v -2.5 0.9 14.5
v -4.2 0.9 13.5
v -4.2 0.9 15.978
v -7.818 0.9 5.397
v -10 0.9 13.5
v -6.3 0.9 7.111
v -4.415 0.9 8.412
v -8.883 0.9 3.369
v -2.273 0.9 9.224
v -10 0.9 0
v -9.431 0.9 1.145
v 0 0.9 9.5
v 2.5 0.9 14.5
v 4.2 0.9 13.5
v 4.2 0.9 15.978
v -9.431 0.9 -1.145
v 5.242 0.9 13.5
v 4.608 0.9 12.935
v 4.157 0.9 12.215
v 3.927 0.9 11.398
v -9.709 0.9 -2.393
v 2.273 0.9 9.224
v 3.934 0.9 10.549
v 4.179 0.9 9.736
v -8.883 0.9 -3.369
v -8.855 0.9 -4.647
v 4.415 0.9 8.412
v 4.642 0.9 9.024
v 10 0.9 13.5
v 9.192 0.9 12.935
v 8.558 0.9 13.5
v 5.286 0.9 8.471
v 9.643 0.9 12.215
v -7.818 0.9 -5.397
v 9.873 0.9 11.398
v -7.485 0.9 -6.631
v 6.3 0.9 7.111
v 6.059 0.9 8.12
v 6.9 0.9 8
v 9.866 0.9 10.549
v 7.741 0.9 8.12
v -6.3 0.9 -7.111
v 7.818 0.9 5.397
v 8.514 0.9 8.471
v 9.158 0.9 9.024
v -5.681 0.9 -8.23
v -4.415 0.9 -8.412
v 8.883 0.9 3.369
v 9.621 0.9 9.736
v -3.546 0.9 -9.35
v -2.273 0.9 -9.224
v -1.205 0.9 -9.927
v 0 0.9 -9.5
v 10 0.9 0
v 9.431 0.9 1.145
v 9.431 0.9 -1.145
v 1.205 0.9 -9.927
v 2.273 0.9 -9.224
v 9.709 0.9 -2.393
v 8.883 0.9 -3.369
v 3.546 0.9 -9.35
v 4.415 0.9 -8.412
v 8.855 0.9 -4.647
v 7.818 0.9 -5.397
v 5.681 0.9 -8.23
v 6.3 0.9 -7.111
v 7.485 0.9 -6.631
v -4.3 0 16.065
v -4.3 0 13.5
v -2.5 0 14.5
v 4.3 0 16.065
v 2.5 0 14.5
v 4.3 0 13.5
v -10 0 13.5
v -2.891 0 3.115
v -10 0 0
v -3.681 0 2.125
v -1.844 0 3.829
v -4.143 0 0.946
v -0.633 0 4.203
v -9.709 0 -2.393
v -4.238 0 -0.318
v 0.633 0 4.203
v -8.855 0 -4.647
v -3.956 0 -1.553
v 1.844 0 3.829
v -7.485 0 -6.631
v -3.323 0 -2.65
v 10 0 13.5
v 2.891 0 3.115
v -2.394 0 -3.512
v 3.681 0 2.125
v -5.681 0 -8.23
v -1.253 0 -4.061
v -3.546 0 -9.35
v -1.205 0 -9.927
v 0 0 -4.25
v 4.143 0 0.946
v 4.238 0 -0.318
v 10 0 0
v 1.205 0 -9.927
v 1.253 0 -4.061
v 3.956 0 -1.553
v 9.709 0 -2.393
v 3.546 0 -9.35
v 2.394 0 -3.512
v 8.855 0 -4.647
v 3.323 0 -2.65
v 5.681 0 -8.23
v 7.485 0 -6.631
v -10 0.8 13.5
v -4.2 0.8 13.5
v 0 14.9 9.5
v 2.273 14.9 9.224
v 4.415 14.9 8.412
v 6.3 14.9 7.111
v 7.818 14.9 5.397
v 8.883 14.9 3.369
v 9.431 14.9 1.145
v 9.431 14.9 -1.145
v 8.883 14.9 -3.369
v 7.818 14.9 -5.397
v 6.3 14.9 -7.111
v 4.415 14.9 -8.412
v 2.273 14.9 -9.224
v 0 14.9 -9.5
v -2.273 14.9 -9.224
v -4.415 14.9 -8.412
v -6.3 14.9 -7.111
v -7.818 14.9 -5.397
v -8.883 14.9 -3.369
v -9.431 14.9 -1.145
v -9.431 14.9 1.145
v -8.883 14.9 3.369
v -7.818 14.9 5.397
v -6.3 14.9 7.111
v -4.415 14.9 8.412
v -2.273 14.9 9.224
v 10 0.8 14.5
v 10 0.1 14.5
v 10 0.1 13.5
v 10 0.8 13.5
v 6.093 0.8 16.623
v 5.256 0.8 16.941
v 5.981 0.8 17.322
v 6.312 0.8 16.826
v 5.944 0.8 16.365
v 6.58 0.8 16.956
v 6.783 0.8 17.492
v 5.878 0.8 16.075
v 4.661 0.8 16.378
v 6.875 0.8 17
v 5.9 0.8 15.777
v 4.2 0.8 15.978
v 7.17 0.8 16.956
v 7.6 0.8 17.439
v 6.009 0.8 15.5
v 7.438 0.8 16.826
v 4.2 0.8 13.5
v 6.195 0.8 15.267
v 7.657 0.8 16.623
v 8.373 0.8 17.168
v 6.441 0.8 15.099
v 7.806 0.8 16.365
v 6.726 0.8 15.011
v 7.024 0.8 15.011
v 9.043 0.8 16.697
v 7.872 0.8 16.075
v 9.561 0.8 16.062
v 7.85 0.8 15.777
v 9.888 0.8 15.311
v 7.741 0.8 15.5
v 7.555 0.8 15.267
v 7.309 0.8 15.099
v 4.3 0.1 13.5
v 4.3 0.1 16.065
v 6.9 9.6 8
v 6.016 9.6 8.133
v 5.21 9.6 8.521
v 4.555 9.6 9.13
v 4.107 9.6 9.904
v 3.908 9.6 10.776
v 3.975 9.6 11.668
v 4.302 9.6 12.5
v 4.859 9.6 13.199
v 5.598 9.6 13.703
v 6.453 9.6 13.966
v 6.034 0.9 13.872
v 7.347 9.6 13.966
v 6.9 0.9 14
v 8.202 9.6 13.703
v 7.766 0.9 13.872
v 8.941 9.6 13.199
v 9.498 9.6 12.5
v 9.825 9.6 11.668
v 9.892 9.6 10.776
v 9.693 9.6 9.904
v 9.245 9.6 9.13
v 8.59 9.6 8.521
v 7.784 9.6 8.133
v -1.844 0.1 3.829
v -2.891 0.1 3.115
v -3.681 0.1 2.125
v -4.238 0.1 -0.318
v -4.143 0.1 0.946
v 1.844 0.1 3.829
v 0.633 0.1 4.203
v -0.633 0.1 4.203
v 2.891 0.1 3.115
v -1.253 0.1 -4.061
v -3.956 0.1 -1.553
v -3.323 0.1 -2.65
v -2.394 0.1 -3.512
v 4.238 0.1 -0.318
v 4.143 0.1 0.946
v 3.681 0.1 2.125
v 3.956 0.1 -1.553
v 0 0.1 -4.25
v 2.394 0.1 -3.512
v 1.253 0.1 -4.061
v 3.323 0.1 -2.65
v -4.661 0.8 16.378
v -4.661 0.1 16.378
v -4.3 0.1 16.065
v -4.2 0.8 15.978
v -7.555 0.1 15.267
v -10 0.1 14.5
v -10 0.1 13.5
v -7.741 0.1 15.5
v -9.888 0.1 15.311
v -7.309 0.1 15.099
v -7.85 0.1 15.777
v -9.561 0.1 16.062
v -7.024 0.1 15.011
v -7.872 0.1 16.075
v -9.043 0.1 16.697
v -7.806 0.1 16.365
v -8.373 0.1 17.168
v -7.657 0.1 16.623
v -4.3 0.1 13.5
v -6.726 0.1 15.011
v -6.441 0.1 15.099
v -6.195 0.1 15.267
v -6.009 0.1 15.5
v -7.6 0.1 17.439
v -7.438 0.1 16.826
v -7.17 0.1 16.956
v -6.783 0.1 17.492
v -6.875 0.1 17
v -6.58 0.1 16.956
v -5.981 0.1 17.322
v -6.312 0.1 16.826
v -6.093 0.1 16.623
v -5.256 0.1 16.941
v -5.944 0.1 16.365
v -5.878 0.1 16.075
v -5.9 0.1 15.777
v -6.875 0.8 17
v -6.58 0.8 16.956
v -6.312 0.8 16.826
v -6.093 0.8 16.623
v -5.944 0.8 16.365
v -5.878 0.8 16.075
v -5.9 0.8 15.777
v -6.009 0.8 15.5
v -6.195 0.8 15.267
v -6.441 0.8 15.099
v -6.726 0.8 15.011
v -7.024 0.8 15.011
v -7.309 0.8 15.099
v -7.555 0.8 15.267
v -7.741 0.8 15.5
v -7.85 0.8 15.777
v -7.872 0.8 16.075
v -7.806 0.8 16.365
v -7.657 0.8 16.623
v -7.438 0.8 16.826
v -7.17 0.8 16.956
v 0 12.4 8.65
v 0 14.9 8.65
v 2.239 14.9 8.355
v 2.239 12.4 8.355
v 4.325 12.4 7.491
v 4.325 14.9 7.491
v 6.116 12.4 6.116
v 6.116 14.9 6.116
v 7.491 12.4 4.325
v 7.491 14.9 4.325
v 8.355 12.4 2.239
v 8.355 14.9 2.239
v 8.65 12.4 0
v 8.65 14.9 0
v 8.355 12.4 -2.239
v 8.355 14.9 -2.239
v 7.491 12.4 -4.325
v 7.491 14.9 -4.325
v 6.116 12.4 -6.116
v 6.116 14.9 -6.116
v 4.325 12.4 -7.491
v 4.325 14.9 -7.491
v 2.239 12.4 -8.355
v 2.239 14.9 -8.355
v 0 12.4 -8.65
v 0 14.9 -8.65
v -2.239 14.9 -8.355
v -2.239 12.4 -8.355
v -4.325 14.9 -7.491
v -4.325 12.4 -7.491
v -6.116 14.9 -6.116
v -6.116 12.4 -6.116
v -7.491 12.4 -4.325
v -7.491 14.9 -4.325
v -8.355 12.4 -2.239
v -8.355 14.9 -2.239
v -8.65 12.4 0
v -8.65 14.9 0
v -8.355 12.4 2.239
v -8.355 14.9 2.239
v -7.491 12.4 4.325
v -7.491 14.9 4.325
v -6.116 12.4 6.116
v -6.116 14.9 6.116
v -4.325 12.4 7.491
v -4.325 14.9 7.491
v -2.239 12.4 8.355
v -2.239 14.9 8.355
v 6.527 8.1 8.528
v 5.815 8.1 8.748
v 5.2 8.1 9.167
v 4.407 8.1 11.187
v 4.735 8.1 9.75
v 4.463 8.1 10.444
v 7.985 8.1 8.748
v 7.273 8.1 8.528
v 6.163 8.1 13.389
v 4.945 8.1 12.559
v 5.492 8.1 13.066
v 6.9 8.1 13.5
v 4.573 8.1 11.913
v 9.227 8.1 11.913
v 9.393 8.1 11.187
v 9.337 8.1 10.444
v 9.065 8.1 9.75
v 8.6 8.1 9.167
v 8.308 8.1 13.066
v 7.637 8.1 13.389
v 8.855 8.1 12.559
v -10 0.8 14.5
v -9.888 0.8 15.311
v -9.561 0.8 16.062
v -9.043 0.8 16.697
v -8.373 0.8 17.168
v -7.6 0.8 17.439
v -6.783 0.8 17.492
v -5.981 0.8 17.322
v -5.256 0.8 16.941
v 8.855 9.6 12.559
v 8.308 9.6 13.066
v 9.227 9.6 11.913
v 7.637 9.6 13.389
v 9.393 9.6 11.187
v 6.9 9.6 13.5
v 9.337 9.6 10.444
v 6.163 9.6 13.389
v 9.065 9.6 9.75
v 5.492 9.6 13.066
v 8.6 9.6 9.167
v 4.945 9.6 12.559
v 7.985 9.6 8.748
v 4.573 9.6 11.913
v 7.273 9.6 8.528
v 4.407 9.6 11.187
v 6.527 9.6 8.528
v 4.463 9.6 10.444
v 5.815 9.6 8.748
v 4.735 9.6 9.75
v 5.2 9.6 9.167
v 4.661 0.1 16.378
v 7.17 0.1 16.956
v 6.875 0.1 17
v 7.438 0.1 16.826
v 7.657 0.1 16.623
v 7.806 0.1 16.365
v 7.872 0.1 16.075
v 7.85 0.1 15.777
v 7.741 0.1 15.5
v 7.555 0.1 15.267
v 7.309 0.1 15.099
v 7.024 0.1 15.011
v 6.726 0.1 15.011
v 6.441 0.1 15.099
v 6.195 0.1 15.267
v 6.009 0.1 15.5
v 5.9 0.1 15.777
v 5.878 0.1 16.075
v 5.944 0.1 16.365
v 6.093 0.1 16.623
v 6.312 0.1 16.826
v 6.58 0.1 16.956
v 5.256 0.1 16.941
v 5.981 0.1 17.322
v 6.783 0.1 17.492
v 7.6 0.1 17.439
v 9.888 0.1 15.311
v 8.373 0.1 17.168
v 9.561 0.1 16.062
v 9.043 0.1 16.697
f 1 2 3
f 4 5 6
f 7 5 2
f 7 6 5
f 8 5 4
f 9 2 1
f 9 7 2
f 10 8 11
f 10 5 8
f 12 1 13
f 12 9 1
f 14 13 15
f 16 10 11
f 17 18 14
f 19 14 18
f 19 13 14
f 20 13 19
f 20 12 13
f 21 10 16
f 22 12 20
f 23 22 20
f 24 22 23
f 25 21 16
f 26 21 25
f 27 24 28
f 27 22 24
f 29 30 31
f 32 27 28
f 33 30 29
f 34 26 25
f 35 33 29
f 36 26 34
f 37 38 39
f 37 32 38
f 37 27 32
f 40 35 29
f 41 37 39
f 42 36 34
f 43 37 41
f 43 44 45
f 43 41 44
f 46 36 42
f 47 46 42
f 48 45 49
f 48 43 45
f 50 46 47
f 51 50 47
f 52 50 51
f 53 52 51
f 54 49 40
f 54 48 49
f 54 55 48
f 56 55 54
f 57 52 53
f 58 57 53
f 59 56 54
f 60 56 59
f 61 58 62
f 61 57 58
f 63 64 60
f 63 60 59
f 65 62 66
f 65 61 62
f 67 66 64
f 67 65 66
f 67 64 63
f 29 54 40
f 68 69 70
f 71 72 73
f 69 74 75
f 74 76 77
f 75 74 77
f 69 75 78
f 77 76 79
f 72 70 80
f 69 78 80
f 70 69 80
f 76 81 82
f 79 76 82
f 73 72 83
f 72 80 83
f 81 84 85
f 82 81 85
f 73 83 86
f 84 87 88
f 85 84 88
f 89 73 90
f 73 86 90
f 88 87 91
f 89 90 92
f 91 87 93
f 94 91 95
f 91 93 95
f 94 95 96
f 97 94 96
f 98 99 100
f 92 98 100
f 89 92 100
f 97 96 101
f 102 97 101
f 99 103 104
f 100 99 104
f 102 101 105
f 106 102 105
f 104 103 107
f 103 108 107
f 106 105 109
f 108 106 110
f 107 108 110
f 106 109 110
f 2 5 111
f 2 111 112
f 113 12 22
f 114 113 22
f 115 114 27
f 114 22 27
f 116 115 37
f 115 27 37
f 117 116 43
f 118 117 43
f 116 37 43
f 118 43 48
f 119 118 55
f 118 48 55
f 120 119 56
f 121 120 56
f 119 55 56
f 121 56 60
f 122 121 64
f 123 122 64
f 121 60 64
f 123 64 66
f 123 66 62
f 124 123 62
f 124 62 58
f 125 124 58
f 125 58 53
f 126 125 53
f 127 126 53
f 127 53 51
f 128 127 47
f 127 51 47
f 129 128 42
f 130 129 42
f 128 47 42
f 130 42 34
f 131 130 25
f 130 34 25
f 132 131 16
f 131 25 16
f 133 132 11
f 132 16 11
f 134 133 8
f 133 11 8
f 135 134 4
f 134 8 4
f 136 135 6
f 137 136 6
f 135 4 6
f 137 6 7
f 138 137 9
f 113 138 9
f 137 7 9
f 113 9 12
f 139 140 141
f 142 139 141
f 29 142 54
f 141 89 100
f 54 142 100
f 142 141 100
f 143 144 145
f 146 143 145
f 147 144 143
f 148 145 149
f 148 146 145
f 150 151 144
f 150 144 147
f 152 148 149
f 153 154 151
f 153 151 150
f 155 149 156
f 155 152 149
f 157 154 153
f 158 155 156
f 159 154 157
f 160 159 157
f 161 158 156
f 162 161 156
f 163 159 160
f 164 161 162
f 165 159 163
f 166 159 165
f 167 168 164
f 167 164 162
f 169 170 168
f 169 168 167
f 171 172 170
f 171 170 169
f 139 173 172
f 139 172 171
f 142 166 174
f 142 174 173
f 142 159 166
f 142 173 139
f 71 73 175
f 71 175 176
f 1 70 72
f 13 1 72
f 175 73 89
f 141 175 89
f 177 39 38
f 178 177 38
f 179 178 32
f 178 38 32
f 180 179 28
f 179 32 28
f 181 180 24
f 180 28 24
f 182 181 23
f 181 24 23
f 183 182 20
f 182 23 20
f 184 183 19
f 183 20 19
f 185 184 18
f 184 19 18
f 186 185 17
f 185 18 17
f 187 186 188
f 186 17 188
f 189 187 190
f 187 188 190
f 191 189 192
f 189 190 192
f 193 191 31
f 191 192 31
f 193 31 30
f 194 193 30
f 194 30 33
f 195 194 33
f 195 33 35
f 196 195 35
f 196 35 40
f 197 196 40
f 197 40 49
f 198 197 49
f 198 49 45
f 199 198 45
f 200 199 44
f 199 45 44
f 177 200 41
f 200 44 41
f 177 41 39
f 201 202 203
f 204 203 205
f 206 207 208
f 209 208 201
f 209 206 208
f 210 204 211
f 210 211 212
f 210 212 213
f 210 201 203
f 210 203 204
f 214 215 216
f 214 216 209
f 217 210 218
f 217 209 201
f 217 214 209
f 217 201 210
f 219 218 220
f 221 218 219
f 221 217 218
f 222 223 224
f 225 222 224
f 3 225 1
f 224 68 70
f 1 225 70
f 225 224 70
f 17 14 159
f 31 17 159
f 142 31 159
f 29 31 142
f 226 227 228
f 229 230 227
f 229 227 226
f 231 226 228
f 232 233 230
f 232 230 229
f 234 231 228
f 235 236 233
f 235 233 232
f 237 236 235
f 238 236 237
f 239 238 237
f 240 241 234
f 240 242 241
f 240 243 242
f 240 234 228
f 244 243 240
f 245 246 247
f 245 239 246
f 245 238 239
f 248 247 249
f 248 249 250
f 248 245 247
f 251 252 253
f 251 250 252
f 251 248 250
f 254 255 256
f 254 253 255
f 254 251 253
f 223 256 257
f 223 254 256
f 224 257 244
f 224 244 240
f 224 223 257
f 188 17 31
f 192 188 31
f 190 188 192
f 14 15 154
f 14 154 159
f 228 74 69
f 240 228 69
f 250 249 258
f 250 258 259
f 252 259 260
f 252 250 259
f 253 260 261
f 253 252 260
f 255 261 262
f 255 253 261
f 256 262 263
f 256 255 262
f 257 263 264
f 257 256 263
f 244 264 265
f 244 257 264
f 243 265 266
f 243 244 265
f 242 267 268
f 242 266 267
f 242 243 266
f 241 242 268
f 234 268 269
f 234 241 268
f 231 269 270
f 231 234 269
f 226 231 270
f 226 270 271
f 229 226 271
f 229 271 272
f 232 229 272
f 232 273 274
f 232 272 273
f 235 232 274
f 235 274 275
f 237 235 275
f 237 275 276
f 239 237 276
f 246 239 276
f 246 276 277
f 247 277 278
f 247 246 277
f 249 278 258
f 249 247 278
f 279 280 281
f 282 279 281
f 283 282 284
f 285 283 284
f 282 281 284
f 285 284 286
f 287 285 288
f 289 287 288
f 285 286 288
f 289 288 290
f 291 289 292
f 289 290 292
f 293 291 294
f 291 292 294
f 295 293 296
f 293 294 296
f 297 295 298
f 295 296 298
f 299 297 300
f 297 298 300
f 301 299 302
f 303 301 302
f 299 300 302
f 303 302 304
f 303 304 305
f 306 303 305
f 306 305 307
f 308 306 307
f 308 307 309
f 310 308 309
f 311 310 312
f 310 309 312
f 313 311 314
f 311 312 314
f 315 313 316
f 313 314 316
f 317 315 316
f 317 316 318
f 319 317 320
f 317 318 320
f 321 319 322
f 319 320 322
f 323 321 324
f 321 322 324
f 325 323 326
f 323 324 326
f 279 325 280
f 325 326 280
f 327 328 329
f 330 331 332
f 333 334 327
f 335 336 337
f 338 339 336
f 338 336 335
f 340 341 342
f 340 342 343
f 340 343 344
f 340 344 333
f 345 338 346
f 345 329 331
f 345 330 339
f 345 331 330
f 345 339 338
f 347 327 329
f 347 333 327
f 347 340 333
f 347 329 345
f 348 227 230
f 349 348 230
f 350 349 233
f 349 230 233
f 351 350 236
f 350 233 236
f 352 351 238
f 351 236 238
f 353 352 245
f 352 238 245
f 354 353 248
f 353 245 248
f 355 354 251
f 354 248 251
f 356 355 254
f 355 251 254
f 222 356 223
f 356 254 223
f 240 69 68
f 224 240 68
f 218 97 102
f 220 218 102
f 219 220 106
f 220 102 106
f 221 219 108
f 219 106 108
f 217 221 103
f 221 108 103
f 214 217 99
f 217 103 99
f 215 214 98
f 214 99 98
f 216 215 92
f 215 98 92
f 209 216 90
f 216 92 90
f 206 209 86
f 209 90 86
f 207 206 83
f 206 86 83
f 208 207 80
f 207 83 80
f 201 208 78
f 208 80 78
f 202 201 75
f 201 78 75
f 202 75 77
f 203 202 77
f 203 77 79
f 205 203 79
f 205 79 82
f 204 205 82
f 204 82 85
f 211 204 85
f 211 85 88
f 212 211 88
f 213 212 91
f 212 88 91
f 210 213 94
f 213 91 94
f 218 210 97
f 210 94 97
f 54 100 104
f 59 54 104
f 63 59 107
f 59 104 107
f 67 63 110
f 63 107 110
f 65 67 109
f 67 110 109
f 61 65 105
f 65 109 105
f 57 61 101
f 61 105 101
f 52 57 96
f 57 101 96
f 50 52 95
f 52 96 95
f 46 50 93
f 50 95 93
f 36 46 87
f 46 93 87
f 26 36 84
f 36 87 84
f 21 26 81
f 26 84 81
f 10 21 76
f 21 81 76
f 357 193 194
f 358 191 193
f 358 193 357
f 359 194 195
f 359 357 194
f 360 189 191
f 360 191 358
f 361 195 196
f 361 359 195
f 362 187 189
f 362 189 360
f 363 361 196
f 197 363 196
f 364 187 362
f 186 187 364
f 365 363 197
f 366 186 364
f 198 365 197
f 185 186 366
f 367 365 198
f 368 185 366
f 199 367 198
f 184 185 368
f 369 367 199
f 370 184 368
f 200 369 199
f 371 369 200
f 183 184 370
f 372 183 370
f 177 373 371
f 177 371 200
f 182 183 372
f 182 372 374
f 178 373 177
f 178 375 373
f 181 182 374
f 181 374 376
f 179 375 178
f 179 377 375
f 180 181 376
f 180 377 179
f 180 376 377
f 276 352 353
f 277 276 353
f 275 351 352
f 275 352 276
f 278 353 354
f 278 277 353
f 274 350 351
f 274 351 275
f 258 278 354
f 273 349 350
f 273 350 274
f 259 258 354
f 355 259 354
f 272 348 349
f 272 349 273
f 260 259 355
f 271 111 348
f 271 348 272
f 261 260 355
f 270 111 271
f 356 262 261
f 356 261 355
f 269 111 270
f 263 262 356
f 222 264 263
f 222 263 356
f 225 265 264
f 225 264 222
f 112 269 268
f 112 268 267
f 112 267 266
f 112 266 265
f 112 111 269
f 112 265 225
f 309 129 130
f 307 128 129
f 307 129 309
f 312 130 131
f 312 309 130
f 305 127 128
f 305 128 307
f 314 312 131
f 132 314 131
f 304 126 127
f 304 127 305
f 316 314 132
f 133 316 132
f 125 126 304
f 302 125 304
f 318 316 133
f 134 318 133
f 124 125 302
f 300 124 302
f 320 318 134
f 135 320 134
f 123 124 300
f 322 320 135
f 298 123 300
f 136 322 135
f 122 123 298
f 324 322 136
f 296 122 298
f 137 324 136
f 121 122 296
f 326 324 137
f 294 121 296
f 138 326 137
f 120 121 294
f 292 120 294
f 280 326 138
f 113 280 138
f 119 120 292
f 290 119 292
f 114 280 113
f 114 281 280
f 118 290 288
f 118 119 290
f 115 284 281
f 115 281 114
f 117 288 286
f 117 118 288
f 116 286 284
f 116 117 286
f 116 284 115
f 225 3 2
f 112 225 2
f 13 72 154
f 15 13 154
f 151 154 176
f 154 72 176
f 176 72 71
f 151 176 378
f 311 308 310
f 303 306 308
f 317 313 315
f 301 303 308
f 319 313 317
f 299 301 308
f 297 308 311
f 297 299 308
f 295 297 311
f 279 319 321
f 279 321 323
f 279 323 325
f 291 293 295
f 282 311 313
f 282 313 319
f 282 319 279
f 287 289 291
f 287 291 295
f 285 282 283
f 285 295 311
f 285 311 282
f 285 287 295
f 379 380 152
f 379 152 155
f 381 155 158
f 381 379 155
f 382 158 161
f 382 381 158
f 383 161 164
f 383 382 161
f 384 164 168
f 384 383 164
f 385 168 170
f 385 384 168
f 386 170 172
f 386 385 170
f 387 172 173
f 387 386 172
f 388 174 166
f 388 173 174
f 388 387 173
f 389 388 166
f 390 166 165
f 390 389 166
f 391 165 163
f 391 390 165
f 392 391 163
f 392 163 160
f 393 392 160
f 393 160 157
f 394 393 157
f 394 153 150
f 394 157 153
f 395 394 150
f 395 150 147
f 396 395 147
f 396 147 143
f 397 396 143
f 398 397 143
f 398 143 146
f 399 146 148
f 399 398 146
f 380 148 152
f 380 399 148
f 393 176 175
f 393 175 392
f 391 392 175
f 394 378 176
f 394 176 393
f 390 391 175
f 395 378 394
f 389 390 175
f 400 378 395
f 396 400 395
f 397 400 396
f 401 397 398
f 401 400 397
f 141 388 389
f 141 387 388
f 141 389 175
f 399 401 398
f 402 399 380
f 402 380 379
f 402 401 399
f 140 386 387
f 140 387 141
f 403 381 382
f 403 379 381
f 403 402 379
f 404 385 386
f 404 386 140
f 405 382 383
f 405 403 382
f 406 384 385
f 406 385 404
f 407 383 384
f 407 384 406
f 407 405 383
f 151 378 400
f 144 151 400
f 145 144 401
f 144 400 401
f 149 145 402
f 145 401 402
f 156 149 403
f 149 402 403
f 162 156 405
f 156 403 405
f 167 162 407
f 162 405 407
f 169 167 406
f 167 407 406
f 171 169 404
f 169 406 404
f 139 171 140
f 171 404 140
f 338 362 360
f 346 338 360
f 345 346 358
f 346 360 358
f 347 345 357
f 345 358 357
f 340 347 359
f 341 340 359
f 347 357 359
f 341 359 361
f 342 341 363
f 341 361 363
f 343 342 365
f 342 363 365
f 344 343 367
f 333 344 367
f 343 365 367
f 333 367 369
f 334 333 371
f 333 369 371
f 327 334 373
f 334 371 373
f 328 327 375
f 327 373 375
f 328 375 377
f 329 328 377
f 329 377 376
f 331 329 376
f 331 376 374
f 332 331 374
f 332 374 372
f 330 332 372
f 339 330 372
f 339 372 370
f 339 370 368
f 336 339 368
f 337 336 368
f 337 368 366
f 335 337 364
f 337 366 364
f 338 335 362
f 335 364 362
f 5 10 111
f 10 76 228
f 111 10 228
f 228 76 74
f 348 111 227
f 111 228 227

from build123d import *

# Parameters (mm, degrees)
ESQUISSE1_R             = 1
BOSS_EXTRU_1_DEPTH      = 0.9
ESQUISSE2_R             = 9.5
BOSS_EXTRU_2_DEPTH      = 14
ESQUISSE3_R             = 8.65
ENL_V_MAT_EXTRU_1_DEPTH = 2.5
ESQUISSE5_R             = 3
BOSS_EXTRU_3_DEPTH      = 8.7
ESQUISSE6_R             = 2.5
ENL_V_MAT_EXTRU_2_DEPTH = 1.5
ESQUISSE7_R             = 4.25
ESQUISSE7_W             = 5.7
ESQUISSE7_H             = 5
ENL_V_MAT_EXTRU_3_DEPTH = 0.1
ESQUISSE8_W             = 5.8
ESQUISSE8_H             = 5
ENL_V_MAT_EXTRU_4_DEPTH = 0.1


with BuildPart() as part:
    # Esquisse1 → Boss.-Extru.1 (new body)
    with BuildSketch(Plane(origin=(0, 0, 0), x_dir=(1, 0, 0), z_dir=(0, 1, 0))):
        with BuildLine():
            Line((-10, 0), (-10, -14.5))
            ThreePointArc((-10, -14.5), (-7.995629382, -17.329968575), (-4.66085191, -16.378399908))
            Line((-4.66085191, -16.378399908), (-2.5, -14.5))
            Line((-2.5, -14.5), (2.5, -14.5))
            Line((2.5, -14.5), (4.66085191, -16.378399908))
            ThreePointArc((4.66085191, -16.378399908), (7.995629382, -17.329968575), (10, -14.5))
            Line((10, -14.5), (10, 0))
            ThreePointArc((10, 0), (0, 10), (-10, 0))
        make_face()
        with Locations(Location((-6.875, -16, 0), (0, 0, 270))):  # turned: the seam where the file's is
            Circle(ESQUISSE1_R, mode=Mode.SUBTRACT)
        with Locations(Location((6.875, -16, 0), (0, 0, 270))):  # turned: the seam where the file's is
            Circle(ESQUISSE1_R, mode=Mode.SUBTRACT)
    extrude(amount=BOSS_EXTRU_1_DEPTH)

    # Esquisse2 → Boss.-Extru.2 (add)
    with BuildSketch(Plane(origin=(0, 0.9, 0), x_dir=(1, 0, 0), z_dir=(0, 1, 0))):
        with Locations(Location((0, 0, 0), (0, 0, 270))):  # turned: the seam where the file's is
            Circle(ESQUISSE2_R)
    extrude(amount=BOSS_EXTRU_2_DEPTH)

    # Esquisse3 → Enlèv. mat.-Extru.1 (cut)
    with BuildSketch(Plane(origin=(0, 14.9, 0), x_dir=(1, 0, 0), z_dir=(0, 1, 0))):
        with Locations(Location((0, 0, 0), (0, 0, 270))):  # turned: the seam where the file's is
            Circle(ESQUISSE3_R)
    extrude(amount=-ENL_V_MAT_EXTRU_1_DEPTH, mode=Mode.SUBTRACT)

    # Esquisse5 → Boss.-Extru.3 (add)
    with BuildSketch(Plane(origin=(0, 0.9, 0), x_dir=(1, 0, 0), z_dir=(0, 1, 0))):
        with Locations(Location((6.9, -11, 0), (0, 0, 90))):  # turned: the seam where the file's is
            Circle(ESQUISSE5_R)
    extrude(amount=BOSS_EXTRU_3_DEPTH)

    # Esquisse6 → Enlèv. mat.-Extru.2 (cut)
    with BuildSketch(Plane(origin=(0, 9.6, 0), x_dir=(1, 0, 0), z_dir=(0, 1, 0))):
        with Locations(Location((6.9, -11, 0), (0, 0, 270))):  # turned: the seam where the file's is
            Circle(ESQUISSE6_R)
    extrude(amount=-ENL_V_MAT_EXTRU_2_DEPTH, mode=Mode.SUBTRACT)

    # Esquisse7 → Enlèv. mat.-Extru.3 (cut)
    with BuildSketch(Plane.XZ):
        with Locations(Location((0, 0, 0), (0, 0, 270))):  # turned: the seam where the file's is
            Circle(ESQUISSE7_R)
        with Locations((-7.15, 16)):
            Rectangle(ESQUISSE7_W, ESQUISSE7_H)
        with Locations((7.15, 16)):
            Rectangle(ESQUISSE7_W, ESQUISSE7_H)
    extrude(amount=-ENL_V_MAT_EXTRU_3_DEPTH, mode=Mode.SUBTRACT)

    # Esquisse8 → Enlèv. mat.-Extru.4 (cut)
    with BuildSketch(Plane(origin=(0, 0.9, 0), x_dir=(1, 0, 0), z_dir=(0, 1, 0))):
        with Locations((-7.1, -16)):
            Rectangle(ESQUISSE8_W, ESQUISSE8_H)
        with Locations((7.1, -16)):
            Rectangle(ESQUISSE8_W, ESQUISSE8_H)
    extrude(amount=-ENL_V_MAT_EXTRU_4_DEPTH, mode=Mode.SUBTRACT)


solid = part.part
